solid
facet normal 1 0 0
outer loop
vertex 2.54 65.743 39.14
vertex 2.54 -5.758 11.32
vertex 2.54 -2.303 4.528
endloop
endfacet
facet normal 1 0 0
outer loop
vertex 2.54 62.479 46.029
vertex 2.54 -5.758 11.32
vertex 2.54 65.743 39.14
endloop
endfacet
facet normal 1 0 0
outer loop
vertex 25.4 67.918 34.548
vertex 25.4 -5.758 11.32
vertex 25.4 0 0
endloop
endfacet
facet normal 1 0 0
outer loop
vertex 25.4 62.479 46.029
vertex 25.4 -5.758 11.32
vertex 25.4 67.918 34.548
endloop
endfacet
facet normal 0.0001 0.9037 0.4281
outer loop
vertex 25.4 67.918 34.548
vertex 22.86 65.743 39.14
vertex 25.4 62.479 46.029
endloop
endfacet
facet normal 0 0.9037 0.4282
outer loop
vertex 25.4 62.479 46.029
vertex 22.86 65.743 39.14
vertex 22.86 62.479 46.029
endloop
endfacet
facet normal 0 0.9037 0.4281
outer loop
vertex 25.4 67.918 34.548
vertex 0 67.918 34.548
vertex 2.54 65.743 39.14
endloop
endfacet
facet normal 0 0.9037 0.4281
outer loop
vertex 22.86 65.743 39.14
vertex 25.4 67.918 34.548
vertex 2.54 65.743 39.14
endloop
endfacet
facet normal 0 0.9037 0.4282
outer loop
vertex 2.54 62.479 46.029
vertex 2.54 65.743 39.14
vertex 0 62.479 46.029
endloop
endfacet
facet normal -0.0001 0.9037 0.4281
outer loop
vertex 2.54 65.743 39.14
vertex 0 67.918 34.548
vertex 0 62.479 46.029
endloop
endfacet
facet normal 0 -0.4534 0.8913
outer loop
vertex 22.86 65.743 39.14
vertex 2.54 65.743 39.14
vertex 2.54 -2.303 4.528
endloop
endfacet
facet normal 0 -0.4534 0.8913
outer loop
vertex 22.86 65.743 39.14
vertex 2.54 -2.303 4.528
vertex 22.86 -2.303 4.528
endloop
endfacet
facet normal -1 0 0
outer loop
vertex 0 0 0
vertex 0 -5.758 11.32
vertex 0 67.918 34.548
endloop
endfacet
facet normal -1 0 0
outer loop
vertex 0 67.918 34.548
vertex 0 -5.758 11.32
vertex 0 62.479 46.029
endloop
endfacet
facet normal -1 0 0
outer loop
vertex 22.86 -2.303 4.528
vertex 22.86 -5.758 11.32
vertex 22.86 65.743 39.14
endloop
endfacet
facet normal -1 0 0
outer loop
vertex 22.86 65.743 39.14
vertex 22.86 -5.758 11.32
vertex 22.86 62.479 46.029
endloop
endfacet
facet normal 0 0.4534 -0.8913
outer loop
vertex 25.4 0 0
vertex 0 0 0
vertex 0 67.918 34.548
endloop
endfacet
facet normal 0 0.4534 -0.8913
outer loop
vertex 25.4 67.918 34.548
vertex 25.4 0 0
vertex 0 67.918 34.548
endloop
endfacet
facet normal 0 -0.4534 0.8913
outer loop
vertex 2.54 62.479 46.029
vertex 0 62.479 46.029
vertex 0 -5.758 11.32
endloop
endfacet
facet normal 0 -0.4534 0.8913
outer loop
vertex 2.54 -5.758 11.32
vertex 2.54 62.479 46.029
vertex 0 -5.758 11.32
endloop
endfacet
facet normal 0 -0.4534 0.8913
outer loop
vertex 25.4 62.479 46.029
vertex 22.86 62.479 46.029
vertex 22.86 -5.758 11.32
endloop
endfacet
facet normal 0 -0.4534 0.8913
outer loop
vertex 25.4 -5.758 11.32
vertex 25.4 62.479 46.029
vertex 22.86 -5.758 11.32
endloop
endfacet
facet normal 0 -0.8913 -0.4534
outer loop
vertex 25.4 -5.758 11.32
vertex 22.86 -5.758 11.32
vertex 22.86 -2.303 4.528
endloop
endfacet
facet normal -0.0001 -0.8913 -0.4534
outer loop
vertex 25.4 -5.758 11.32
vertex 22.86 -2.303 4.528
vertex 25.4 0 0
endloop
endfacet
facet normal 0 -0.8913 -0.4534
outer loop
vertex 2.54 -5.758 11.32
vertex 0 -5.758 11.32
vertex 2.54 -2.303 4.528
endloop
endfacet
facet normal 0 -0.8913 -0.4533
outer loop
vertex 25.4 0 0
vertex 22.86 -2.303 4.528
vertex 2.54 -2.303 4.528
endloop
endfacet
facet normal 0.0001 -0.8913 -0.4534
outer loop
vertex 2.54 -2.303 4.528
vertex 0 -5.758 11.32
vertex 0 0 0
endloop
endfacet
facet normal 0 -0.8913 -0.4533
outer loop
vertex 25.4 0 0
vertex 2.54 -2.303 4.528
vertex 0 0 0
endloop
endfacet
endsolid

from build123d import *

# Parameters (mm, degrees)
F1_DEPTH = 25.4
F2_W     = 20.32
F2_H     = 76.557289119
F3_DEPTH = 7.62


with BuildPart() as f1:
    # F0 (on Right) → F1 (new body)
    with BuildSketch(Plane.YZ):
        Polygon((-5.7579418114, 11.3197219973), (0, 0), (67.918331984, 34.5476508683), (62.4788479285, 46.0293610512), align=None)
    extrude(amount=F1_DEPTH)

    # F2 (on face) → F3 (cut)
    with BuildSketch(Plane(origin=(0, -5.7579418114, 11.3197219973), x_dir=(1, 0, 0), z_dir=(0, -0.453381245, 0.8913166927))):
        with Locations((12.7, 38.2786445595)):
            Rectangle(F2_W, F2_H)
    extrude(amount=-F3_DEPTH, mode=Mode.SUBTRACT)


solid = f1.part
